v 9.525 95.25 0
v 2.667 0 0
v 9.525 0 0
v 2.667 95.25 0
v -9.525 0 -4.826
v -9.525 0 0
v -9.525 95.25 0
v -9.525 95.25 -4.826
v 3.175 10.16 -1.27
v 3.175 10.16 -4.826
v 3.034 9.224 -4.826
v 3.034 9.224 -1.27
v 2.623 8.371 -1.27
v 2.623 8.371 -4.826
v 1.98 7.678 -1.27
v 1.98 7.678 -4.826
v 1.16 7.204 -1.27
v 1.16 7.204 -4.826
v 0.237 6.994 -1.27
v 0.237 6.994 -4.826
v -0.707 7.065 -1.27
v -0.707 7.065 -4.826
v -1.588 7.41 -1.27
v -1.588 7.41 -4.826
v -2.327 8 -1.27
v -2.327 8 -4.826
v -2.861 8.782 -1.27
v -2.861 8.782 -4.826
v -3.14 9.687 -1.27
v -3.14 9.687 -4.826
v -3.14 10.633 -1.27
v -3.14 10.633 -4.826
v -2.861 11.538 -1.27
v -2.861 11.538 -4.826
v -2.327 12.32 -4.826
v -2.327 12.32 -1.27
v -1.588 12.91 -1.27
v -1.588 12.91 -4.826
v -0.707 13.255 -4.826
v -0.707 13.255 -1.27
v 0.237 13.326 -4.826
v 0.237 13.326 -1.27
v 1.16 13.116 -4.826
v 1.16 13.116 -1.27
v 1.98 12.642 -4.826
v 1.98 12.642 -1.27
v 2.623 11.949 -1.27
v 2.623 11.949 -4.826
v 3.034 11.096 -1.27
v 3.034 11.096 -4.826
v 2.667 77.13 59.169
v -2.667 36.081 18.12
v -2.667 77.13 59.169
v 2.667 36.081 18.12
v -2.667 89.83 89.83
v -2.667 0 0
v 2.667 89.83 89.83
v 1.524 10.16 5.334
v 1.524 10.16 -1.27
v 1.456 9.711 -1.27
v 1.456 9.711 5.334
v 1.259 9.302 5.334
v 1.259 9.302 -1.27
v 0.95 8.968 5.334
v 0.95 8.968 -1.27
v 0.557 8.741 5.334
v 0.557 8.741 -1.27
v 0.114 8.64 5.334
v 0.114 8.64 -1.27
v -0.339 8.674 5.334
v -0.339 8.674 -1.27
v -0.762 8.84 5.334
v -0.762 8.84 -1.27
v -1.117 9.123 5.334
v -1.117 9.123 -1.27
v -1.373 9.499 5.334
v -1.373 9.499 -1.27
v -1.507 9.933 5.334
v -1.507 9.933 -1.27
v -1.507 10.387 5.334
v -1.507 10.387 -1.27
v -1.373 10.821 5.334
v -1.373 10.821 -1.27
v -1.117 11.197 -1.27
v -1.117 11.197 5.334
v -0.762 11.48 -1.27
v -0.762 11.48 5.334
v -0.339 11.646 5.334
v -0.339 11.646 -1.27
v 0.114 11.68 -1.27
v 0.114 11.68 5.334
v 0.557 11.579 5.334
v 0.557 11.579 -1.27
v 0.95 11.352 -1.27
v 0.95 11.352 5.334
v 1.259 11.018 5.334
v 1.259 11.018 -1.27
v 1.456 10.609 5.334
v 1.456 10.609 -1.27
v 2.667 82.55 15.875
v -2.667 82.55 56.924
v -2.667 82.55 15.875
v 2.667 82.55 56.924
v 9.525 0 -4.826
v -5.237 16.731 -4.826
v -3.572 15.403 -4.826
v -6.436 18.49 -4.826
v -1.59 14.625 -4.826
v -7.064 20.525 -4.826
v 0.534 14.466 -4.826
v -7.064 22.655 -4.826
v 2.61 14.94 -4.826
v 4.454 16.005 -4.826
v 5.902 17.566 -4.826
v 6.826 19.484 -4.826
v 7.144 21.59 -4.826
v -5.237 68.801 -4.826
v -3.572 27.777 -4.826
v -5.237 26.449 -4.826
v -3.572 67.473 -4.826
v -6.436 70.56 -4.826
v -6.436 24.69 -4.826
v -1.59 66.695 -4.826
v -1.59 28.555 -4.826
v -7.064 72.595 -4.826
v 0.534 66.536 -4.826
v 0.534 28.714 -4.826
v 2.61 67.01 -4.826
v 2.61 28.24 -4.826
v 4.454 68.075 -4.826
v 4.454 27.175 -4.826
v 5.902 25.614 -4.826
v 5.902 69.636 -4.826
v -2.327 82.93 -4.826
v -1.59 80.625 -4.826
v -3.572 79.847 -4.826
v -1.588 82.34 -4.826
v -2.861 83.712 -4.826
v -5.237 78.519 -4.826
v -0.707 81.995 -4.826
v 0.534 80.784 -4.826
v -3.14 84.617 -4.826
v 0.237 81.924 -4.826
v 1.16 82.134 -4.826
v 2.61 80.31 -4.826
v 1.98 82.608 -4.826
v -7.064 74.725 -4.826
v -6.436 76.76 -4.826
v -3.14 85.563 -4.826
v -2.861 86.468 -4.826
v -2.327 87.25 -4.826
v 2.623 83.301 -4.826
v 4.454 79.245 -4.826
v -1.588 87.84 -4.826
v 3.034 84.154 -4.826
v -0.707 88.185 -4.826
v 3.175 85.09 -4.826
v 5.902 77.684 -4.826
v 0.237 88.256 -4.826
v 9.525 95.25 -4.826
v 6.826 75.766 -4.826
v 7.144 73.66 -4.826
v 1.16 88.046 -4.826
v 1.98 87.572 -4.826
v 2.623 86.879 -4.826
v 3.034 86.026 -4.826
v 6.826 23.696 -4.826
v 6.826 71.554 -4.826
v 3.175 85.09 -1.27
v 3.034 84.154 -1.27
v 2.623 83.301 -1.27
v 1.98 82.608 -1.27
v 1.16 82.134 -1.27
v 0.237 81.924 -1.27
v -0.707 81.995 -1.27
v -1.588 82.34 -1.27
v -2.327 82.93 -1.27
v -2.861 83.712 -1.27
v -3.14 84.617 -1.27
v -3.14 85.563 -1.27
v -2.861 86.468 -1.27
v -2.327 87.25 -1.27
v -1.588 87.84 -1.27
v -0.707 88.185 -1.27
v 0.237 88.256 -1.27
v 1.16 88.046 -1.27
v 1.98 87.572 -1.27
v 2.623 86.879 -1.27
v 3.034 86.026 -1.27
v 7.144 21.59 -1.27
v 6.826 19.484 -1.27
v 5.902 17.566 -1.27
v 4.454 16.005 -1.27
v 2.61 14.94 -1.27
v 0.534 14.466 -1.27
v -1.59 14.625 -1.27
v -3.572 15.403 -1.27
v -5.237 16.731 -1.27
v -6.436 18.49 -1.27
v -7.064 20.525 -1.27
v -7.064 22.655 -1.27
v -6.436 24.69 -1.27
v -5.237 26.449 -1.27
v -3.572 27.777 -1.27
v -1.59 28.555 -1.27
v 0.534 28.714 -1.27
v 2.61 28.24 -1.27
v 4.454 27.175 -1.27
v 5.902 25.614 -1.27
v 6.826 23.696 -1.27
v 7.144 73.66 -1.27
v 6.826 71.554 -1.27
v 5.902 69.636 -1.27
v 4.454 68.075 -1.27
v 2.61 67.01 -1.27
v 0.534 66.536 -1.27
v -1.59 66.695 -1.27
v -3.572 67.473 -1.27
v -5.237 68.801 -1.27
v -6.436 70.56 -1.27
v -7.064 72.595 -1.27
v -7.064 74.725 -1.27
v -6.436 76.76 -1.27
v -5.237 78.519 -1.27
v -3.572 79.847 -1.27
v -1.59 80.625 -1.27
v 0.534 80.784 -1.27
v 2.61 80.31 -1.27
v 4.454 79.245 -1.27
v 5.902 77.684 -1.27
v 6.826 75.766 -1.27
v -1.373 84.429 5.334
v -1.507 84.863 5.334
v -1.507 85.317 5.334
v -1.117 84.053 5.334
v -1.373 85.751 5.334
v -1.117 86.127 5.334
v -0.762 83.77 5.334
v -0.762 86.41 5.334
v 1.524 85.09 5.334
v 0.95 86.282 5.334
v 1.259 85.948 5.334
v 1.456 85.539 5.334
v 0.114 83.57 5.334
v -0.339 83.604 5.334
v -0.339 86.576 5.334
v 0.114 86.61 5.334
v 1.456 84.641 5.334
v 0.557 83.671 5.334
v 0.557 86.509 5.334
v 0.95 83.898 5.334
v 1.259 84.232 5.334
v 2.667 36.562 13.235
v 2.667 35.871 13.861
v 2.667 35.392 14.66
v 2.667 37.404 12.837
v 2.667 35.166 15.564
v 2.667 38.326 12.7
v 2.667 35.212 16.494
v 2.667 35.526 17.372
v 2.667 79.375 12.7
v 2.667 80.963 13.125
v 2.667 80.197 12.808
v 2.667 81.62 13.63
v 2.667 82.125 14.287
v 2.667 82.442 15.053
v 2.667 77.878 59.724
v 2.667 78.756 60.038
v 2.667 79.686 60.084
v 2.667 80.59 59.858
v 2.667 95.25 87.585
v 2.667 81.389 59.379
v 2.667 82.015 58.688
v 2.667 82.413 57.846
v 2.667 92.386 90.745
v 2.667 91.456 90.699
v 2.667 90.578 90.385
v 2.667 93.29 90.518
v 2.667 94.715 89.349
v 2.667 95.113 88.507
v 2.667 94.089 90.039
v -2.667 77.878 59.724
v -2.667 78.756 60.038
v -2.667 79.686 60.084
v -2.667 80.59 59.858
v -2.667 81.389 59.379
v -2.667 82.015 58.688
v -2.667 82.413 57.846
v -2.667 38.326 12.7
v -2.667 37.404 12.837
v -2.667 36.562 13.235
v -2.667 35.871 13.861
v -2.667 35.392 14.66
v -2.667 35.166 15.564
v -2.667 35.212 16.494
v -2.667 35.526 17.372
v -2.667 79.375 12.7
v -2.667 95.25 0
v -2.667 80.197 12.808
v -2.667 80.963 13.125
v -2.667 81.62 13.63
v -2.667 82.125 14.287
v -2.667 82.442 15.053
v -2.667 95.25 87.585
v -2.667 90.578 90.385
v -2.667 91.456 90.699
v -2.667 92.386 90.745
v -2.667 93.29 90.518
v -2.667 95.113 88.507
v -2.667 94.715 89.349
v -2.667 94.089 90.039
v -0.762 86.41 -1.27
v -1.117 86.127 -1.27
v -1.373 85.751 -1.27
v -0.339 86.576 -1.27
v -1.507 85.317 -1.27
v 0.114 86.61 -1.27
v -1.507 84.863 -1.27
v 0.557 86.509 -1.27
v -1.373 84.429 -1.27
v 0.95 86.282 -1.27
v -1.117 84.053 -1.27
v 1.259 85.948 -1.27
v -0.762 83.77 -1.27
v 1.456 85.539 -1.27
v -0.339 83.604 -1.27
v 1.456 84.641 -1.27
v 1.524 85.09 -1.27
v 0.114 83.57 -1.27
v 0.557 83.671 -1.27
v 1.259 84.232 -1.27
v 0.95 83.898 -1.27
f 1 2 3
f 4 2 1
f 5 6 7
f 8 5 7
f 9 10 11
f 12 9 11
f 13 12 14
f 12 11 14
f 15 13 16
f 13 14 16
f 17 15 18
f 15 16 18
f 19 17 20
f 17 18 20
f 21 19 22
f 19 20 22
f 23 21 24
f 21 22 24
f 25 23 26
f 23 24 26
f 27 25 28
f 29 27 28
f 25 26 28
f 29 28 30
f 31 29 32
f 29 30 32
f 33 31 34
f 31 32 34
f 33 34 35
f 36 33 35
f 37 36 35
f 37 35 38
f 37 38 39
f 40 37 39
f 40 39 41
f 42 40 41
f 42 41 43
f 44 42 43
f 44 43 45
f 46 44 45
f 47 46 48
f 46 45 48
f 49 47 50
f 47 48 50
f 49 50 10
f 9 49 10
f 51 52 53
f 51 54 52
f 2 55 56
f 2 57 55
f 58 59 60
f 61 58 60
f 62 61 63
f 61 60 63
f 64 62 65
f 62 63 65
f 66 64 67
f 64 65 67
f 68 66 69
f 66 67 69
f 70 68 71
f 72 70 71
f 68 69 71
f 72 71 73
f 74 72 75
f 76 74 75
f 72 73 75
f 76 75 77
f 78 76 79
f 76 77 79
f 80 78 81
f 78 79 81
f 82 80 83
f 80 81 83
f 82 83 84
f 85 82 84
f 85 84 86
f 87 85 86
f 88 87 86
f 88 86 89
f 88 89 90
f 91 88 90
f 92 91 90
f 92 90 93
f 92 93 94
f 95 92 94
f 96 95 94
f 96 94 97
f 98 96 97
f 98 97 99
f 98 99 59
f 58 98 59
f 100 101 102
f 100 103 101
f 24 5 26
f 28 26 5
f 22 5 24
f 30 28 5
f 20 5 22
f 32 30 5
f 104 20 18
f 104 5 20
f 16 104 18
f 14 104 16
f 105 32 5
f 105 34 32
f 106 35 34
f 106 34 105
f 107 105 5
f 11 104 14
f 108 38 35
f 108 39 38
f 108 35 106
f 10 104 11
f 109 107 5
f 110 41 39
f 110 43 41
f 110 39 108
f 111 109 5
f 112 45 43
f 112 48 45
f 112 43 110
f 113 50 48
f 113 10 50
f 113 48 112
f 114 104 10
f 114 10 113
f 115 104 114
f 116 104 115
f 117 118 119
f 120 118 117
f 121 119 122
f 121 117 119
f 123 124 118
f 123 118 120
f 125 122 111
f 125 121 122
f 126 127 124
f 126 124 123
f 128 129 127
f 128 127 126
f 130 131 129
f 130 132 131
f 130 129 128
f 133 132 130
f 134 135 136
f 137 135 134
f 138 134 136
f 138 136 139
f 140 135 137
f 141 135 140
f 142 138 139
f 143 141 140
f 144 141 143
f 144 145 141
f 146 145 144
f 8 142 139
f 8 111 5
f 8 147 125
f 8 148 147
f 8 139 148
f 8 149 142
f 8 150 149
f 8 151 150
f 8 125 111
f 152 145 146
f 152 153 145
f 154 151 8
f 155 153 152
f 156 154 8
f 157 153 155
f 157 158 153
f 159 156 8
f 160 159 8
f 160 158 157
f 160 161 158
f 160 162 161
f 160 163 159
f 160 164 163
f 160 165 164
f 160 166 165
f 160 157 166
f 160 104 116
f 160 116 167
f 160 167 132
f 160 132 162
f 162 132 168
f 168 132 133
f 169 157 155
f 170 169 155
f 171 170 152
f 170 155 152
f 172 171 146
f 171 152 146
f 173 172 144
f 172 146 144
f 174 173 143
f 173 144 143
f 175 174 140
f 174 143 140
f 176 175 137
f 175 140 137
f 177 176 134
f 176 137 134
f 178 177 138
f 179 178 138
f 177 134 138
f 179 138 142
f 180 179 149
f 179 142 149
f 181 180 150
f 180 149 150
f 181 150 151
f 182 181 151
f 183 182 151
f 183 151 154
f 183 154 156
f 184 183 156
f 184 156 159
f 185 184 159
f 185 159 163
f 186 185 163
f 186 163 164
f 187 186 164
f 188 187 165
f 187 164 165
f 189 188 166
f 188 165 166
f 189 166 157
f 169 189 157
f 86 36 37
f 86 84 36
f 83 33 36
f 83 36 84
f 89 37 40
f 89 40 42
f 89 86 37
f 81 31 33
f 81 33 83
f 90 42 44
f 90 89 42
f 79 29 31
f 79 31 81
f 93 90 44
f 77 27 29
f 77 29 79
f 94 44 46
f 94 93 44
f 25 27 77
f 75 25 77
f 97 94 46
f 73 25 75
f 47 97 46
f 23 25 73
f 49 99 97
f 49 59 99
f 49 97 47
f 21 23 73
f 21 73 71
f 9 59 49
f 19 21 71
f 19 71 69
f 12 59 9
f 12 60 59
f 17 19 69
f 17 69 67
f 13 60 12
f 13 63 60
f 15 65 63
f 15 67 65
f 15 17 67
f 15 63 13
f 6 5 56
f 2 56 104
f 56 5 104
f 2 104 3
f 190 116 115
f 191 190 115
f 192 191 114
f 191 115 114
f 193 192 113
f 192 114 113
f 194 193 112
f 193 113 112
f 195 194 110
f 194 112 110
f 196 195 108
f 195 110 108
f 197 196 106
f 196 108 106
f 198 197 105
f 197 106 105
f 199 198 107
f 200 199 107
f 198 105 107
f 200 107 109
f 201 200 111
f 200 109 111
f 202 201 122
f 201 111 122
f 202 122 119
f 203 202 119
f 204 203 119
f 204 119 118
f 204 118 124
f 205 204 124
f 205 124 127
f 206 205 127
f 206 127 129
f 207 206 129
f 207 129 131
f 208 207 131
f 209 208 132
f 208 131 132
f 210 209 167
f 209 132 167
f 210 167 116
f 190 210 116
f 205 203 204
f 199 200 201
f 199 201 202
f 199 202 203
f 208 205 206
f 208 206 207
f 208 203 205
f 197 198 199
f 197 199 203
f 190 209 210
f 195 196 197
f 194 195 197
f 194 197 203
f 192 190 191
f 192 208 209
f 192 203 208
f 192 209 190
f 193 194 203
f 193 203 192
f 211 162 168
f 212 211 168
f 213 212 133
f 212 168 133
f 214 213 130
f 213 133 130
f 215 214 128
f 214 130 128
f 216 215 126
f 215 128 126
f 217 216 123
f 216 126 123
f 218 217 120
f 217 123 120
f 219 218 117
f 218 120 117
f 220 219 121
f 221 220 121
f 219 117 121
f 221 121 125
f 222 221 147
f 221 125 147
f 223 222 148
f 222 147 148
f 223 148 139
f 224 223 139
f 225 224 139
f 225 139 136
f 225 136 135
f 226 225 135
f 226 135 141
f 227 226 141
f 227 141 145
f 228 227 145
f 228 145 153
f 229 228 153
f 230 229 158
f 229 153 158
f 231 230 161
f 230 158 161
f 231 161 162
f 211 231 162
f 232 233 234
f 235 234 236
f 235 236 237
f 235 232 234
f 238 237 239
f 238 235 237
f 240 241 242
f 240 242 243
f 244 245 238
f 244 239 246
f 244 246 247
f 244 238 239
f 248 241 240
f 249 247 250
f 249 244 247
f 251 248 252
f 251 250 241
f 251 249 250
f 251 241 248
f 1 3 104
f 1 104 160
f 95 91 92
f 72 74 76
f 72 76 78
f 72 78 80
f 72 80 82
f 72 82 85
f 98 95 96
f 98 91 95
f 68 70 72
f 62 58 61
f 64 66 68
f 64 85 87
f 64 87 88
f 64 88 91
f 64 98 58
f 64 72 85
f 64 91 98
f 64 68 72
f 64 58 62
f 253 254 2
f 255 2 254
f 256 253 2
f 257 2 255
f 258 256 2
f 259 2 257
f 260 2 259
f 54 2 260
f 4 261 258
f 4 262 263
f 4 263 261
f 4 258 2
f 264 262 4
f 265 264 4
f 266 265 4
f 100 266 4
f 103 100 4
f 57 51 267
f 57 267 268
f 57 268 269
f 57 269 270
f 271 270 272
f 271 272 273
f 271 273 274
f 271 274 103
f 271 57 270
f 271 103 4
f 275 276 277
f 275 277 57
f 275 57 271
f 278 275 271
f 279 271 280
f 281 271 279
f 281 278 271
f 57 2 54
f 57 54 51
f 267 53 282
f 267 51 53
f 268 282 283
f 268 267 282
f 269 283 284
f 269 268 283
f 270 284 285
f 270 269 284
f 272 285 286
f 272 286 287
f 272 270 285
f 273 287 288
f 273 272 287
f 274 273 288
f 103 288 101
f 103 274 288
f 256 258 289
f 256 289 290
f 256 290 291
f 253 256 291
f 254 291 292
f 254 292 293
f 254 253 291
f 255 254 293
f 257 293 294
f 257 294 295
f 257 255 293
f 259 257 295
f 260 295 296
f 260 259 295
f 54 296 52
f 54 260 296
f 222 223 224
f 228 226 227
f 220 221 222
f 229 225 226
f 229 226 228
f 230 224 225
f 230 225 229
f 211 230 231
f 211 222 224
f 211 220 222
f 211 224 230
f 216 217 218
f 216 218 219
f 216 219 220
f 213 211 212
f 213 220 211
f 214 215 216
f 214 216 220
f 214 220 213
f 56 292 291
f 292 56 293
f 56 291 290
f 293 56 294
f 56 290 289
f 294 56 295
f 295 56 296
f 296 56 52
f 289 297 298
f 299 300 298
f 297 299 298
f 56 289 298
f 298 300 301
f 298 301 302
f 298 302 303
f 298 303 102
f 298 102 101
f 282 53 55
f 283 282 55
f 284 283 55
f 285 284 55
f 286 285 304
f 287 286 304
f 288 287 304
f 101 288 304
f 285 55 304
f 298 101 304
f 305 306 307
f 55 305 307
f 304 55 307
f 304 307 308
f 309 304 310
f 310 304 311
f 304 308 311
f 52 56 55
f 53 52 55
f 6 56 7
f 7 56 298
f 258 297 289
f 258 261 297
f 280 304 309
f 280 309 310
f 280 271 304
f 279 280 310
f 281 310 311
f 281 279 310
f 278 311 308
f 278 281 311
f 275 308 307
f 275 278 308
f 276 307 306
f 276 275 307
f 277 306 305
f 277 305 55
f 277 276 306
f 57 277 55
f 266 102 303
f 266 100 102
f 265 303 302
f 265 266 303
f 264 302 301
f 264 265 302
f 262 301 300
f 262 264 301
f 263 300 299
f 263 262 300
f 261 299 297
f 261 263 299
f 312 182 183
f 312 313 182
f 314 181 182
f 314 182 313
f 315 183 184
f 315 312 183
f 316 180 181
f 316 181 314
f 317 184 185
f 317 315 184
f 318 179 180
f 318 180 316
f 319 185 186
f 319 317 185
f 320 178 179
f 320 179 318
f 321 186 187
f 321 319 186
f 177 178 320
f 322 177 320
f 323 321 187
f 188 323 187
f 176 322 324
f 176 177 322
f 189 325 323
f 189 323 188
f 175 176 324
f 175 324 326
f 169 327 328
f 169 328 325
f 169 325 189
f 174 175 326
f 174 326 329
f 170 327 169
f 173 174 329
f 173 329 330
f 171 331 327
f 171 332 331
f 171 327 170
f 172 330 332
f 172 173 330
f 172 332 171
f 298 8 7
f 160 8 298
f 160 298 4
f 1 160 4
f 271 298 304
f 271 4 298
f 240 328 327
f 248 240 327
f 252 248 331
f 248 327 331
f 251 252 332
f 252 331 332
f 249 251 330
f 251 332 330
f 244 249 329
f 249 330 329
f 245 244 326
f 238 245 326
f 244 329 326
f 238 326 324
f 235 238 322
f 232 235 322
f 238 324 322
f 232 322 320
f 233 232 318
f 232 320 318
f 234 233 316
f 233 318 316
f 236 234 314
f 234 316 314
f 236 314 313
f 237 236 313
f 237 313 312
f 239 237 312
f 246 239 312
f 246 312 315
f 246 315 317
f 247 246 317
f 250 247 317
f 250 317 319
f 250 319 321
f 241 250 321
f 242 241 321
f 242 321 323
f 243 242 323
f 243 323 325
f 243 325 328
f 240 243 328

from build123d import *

# Parameters (mm, degrees)
F1_DEPTH      = 2.667
F1_DEPTH_BACK = 2.667
F2_W          = 95.25
F2_H          = 4.826
F3_DEPTH      = 9.525
F3_DEPTH_BACK = 9.525
F4_R          = 3.175
F4_R_2        = 7.14375
F5_DEPTH      = 3.556
F6_R          = 1.524
F7_DEPTH      = 10.16


with BuildPart() as f1:
    # F0 (on Right) → F1 (new body, two sides)
    with BuildSketch(Plane.YZ) as f1_sk:
        with BuildLine():
            Line((89.8299359697, 89.8299359697), (0, 0))
            Line((0, 0), (7.6651280605, 0))
            Line((7.6651280605, 0), (95.25, 0))
            Line((95.25, 0), (95.25, 87.5848719395))
            ThreePointArc((95.25, 87.5848719395), (93.2900198978, 90.5181894552), (89.8299359697, 89.8299359697))
        make_face()
        with BuildLine():
            ThreePointArc((38.3256403027, 12.7), (35.3923227869, 14.6599801022), (36.0805762724, 18.1200640303))
            Line((36.0805762724, 18.1200640303), (77.1299359697, 59.1694237276))
            ThreePointArc((77.1299359697, 59.1694237276), (80.5900198978, 59.8576772131), (82.55, 56.9243596973))
            Line((82.55, 56.9243596973), (82.55, 15.875))
            ThreePointArc((82.55, 15.875), (81.6200640303, 13.6299359697), (79.375, 12.7))
            Line((79.375, 12.7), (38.3256403027, 12.7))
        make_face(mode=Mode.SUBTRACT)
    extrude(amount=F1_DEPTH)
    extrude(f1_sk.sketch, amount=-F1_DEPTH_BACK)

    # F2 (on Right) → F3 (join, two sides)
    with BuildSketch(Plane.YZ) as f3_sk:
        with Locations((47.625, -2.413)):
            Rectangle(F2_W, F2_H)
    extrude(amount=F3_DEPTH)
    extrude(f3_sk.sketch, amount=-F3_DEPTH_BACK)

    # F4 (on face) → F5 (cut)
    with BuildSketch(Plane(origin=(0, 0, -4.826), x_dir=(1, 0, 0), z_dir=(0, 0, -1))):
        with Locations((0, -85.09)):
            Circle(F4_R)
        with Locations((0, -10.16)):
            Circle(F4_R)
        with Locations((0, -73.66)):
            Circle(F4_R_2)
        with Locations((0, -21.59)):
            Circle(F4_R_2)
    extrude(amount=-F5_DEPTH, mode=Mode.SUBTRACT)

    # F6 (on face) → F7 (cut)
    with BuildSketch(Plane(origin=(0, 0, -4.826), x_dir=(1, 0, 0), z_dir=(0, 0, -1))):
        with Locations((0, -85.09)):
            Circle(F6_R)
        with Locations((0, -10.16)):
            Circle(F6_R)
    extrude(amount=-F7_DEPTH, mode=Mode.SUBTRACT)


solid = f1.part
